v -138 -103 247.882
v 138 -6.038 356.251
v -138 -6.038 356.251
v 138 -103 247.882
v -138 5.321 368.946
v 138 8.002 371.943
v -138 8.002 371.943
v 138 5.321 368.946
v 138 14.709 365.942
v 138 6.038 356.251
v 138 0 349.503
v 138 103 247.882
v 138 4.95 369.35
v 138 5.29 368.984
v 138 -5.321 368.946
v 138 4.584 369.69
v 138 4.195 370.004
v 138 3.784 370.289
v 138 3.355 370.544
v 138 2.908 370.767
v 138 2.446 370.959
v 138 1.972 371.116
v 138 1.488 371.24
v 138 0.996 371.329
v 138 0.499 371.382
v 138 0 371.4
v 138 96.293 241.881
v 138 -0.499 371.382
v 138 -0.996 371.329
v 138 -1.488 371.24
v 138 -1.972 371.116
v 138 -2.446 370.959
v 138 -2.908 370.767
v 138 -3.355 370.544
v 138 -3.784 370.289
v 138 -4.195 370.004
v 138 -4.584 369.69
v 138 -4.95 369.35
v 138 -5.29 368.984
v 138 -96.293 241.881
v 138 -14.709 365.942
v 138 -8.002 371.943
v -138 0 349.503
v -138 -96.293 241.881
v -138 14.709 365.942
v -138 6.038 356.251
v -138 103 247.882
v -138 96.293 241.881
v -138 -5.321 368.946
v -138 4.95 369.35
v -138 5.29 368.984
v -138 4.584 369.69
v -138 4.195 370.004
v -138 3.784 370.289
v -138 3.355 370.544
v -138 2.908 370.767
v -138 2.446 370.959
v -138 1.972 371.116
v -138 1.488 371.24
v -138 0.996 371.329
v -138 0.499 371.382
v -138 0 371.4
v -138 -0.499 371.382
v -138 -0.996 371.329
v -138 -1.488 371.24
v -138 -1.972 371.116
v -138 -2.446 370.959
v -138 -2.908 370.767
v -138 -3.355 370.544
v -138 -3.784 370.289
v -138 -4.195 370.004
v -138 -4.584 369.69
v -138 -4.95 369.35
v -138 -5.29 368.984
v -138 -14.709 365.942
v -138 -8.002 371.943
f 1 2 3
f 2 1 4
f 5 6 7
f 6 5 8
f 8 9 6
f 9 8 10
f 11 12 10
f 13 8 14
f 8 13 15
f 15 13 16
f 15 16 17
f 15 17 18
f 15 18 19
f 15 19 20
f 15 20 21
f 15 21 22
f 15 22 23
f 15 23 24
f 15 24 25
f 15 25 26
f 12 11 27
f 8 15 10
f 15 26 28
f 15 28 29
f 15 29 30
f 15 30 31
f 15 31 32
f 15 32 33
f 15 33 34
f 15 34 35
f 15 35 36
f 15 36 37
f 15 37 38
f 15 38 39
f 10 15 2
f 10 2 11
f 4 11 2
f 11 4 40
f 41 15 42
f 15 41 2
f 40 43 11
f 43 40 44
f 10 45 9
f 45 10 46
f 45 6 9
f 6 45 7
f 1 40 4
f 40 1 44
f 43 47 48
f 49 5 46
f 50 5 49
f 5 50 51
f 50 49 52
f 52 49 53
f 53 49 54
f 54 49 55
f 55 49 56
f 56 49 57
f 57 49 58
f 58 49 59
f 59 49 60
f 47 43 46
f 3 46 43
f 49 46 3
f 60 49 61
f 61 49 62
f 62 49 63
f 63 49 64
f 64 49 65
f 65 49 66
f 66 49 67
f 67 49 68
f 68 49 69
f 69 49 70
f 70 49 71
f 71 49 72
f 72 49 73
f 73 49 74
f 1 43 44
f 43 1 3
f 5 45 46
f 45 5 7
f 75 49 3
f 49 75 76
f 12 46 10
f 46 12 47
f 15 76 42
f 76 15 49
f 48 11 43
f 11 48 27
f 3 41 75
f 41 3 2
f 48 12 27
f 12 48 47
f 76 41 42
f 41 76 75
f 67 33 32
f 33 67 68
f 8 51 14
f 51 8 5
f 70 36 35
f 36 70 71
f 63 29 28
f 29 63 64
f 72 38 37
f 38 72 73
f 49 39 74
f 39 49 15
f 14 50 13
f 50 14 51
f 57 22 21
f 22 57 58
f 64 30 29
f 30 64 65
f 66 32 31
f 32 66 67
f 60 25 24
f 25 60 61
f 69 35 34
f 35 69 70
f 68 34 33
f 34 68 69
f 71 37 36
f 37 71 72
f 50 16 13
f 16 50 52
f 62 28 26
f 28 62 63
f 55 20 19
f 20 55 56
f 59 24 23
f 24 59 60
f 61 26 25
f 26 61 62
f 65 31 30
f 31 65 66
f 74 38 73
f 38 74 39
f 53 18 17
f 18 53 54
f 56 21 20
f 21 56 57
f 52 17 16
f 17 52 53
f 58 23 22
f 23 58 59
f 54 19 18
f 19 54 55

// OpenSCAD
// file: common.scad
// Shared parameters and placement helpers for the dollhouse.
// `include`d by every component file so variables AND helper modules propagate.

$fa = 2;
$fs = 0.5;
eps = 0.1;

// ---- Core house dimensions (mm) ----
house_w = 240;          // width  (X)
house_d = 170;          // depth  (Y)
wall_t  = 8;            // exterior wall thickness
floor_h = 130;          // interior storey height
mid_t   = 8;            // mid-floor slab thickness
wall_height = floor_h * 2 + mid_t;   // 268
half_depth  = house_d / 2;           // 85

// ---- Roof ----
gable_rise = 95;
ridge_z    = wall_height + gable_rise;   // 363
over_x     = 18;        // gable-end overhang
over_y     = 18;        // eave overhang
roof_w     = house_w + 2 * over_x;       // 276
roof_t     = 9;
ridge_r    = 7;
theta      = atan(gable_rise / half_depth);
panel_len  = (half_depth + over_y) / cos(theta);

// ---- Foundation ----
foundation_h    = 18;
foundation_over = 14;

// ---- Windows ----
win_w   = 42;
win_h   = 58;
frame_w = 6;
frame_t_out = 5;        // how far trim/frame protrudes outside
mull_w  = 3;
ground_z = 67;          // window centre, ground floor
upper_z  = 201;         // window centre, upper floor

// ---- Door ----
door_w = 56;
door_h = 104;

// ---- Chimney ----
chimney_w   = 26;
chimney_d   = 22;
chimney_x   = -72;
chimney_y   = 38;
chimney_base_z = 250;
chimney_top = ridge_z + 40;   // 403

// ---- Window / opening placement lists [u, z_centre] ----
front_windows = [[-80, ground_z], [80, ground_z],
                 [-80, upper_z], [0, upper_z], [80, upper_z]];
back_windows  = [[-80, ground_z], [80, ground_z],
                 [-80, upper_z], [80, upper_z]];
side_windows  = [[-40, ground_z], [40, ground_z],
                 [-40, upper_z], [40, upper_z]];

// ---- Colours ----
col_wall    = "#F2E7CE";
col_roof    = "#9B3B2E";
col_trim    = "#FBFBF7";
col_door    = "#3C5A78";
col_found   = "#9A968E";
col_glass   = "#AFC9DE";
col_chimney = "#A14B36";
col_shutter = "#46603F";
col_stair   = "#C8A97E";

// ---- Helpers ----------------------------------------------------------

// Position children flush against a given exterior face, local +Y = outward.
module place_on_face(face, u, z) {
    if (face == "front")
        translate([u, half_depth, z]) children();
    else if (face == "back")
        translate([u, -half_depth, z]) rotate([0, 0, 180]) children();
    else if (face == "left")
        translate([-house_w / 2, u, z]) rotate([0, 0, 90]) children();
    else
        translate([house_w / 2, u, z]) rotate([0, 0, -90]) children();
}

// Solid that pierces a wall to make a window/door opening.
module opening_cut(face, u, z, w, h) {
    if (face == "front")
        translate([u, half_depth - wall_t / 2, z])
            cube([w, wall_t + 4, h], center = true);
    else if (face == "back")
        translate([u, -(half_depth - wall_t / 2), z])
            cube([w, wall_t + 4, h], center = true);
    else if (face == "left")
        translate([-(house_w / 2 - wall_t / 2), u, z])
            cube([wall_t + 4, w, h], center = true);
    else
        translate([house_w / 2 - wall_t / 2, u, z])
            cube([wall_t + 4, w, h], center = true);
}
// main file
include <common.scad>

// Gabled roof: two pitched panels meeting at a rounded ridge cap,
// with overhangs on all four sides.
module roof() {
    color(col_roof) {
        for (s = [-1, 1])
            roof_panel(s);
        ridge_cap();
    }
}

// One sloped roof panel. s = +1 front (+Y) side, -1 back.
module roof_panel(s) {
    // Flat slab hinged at the ridge line, tilted down the pitch to the eave.
    // Overshoot the ridge by `lap` so the two panels interlock with no gap.
    lap = 12;
    translate([0, 0, ridge_z])
        rotate([0, 0, s > 0 ? 0 : 180])
            rotate([-theta, 0, 0])
                translate([0, (panel_len - lap) / 2, -roof_t / 2])
                    cube([roof_w, panel_len + lap, roof_t], center = true);
}

module ridge_cap() {
    translate([0, 0, ridge_z + ridge_r * 0.2])
        rotate([0, 90, 0])
            cylinder(h = roof_w, r = ridge_r, center = true);
}

roof();
